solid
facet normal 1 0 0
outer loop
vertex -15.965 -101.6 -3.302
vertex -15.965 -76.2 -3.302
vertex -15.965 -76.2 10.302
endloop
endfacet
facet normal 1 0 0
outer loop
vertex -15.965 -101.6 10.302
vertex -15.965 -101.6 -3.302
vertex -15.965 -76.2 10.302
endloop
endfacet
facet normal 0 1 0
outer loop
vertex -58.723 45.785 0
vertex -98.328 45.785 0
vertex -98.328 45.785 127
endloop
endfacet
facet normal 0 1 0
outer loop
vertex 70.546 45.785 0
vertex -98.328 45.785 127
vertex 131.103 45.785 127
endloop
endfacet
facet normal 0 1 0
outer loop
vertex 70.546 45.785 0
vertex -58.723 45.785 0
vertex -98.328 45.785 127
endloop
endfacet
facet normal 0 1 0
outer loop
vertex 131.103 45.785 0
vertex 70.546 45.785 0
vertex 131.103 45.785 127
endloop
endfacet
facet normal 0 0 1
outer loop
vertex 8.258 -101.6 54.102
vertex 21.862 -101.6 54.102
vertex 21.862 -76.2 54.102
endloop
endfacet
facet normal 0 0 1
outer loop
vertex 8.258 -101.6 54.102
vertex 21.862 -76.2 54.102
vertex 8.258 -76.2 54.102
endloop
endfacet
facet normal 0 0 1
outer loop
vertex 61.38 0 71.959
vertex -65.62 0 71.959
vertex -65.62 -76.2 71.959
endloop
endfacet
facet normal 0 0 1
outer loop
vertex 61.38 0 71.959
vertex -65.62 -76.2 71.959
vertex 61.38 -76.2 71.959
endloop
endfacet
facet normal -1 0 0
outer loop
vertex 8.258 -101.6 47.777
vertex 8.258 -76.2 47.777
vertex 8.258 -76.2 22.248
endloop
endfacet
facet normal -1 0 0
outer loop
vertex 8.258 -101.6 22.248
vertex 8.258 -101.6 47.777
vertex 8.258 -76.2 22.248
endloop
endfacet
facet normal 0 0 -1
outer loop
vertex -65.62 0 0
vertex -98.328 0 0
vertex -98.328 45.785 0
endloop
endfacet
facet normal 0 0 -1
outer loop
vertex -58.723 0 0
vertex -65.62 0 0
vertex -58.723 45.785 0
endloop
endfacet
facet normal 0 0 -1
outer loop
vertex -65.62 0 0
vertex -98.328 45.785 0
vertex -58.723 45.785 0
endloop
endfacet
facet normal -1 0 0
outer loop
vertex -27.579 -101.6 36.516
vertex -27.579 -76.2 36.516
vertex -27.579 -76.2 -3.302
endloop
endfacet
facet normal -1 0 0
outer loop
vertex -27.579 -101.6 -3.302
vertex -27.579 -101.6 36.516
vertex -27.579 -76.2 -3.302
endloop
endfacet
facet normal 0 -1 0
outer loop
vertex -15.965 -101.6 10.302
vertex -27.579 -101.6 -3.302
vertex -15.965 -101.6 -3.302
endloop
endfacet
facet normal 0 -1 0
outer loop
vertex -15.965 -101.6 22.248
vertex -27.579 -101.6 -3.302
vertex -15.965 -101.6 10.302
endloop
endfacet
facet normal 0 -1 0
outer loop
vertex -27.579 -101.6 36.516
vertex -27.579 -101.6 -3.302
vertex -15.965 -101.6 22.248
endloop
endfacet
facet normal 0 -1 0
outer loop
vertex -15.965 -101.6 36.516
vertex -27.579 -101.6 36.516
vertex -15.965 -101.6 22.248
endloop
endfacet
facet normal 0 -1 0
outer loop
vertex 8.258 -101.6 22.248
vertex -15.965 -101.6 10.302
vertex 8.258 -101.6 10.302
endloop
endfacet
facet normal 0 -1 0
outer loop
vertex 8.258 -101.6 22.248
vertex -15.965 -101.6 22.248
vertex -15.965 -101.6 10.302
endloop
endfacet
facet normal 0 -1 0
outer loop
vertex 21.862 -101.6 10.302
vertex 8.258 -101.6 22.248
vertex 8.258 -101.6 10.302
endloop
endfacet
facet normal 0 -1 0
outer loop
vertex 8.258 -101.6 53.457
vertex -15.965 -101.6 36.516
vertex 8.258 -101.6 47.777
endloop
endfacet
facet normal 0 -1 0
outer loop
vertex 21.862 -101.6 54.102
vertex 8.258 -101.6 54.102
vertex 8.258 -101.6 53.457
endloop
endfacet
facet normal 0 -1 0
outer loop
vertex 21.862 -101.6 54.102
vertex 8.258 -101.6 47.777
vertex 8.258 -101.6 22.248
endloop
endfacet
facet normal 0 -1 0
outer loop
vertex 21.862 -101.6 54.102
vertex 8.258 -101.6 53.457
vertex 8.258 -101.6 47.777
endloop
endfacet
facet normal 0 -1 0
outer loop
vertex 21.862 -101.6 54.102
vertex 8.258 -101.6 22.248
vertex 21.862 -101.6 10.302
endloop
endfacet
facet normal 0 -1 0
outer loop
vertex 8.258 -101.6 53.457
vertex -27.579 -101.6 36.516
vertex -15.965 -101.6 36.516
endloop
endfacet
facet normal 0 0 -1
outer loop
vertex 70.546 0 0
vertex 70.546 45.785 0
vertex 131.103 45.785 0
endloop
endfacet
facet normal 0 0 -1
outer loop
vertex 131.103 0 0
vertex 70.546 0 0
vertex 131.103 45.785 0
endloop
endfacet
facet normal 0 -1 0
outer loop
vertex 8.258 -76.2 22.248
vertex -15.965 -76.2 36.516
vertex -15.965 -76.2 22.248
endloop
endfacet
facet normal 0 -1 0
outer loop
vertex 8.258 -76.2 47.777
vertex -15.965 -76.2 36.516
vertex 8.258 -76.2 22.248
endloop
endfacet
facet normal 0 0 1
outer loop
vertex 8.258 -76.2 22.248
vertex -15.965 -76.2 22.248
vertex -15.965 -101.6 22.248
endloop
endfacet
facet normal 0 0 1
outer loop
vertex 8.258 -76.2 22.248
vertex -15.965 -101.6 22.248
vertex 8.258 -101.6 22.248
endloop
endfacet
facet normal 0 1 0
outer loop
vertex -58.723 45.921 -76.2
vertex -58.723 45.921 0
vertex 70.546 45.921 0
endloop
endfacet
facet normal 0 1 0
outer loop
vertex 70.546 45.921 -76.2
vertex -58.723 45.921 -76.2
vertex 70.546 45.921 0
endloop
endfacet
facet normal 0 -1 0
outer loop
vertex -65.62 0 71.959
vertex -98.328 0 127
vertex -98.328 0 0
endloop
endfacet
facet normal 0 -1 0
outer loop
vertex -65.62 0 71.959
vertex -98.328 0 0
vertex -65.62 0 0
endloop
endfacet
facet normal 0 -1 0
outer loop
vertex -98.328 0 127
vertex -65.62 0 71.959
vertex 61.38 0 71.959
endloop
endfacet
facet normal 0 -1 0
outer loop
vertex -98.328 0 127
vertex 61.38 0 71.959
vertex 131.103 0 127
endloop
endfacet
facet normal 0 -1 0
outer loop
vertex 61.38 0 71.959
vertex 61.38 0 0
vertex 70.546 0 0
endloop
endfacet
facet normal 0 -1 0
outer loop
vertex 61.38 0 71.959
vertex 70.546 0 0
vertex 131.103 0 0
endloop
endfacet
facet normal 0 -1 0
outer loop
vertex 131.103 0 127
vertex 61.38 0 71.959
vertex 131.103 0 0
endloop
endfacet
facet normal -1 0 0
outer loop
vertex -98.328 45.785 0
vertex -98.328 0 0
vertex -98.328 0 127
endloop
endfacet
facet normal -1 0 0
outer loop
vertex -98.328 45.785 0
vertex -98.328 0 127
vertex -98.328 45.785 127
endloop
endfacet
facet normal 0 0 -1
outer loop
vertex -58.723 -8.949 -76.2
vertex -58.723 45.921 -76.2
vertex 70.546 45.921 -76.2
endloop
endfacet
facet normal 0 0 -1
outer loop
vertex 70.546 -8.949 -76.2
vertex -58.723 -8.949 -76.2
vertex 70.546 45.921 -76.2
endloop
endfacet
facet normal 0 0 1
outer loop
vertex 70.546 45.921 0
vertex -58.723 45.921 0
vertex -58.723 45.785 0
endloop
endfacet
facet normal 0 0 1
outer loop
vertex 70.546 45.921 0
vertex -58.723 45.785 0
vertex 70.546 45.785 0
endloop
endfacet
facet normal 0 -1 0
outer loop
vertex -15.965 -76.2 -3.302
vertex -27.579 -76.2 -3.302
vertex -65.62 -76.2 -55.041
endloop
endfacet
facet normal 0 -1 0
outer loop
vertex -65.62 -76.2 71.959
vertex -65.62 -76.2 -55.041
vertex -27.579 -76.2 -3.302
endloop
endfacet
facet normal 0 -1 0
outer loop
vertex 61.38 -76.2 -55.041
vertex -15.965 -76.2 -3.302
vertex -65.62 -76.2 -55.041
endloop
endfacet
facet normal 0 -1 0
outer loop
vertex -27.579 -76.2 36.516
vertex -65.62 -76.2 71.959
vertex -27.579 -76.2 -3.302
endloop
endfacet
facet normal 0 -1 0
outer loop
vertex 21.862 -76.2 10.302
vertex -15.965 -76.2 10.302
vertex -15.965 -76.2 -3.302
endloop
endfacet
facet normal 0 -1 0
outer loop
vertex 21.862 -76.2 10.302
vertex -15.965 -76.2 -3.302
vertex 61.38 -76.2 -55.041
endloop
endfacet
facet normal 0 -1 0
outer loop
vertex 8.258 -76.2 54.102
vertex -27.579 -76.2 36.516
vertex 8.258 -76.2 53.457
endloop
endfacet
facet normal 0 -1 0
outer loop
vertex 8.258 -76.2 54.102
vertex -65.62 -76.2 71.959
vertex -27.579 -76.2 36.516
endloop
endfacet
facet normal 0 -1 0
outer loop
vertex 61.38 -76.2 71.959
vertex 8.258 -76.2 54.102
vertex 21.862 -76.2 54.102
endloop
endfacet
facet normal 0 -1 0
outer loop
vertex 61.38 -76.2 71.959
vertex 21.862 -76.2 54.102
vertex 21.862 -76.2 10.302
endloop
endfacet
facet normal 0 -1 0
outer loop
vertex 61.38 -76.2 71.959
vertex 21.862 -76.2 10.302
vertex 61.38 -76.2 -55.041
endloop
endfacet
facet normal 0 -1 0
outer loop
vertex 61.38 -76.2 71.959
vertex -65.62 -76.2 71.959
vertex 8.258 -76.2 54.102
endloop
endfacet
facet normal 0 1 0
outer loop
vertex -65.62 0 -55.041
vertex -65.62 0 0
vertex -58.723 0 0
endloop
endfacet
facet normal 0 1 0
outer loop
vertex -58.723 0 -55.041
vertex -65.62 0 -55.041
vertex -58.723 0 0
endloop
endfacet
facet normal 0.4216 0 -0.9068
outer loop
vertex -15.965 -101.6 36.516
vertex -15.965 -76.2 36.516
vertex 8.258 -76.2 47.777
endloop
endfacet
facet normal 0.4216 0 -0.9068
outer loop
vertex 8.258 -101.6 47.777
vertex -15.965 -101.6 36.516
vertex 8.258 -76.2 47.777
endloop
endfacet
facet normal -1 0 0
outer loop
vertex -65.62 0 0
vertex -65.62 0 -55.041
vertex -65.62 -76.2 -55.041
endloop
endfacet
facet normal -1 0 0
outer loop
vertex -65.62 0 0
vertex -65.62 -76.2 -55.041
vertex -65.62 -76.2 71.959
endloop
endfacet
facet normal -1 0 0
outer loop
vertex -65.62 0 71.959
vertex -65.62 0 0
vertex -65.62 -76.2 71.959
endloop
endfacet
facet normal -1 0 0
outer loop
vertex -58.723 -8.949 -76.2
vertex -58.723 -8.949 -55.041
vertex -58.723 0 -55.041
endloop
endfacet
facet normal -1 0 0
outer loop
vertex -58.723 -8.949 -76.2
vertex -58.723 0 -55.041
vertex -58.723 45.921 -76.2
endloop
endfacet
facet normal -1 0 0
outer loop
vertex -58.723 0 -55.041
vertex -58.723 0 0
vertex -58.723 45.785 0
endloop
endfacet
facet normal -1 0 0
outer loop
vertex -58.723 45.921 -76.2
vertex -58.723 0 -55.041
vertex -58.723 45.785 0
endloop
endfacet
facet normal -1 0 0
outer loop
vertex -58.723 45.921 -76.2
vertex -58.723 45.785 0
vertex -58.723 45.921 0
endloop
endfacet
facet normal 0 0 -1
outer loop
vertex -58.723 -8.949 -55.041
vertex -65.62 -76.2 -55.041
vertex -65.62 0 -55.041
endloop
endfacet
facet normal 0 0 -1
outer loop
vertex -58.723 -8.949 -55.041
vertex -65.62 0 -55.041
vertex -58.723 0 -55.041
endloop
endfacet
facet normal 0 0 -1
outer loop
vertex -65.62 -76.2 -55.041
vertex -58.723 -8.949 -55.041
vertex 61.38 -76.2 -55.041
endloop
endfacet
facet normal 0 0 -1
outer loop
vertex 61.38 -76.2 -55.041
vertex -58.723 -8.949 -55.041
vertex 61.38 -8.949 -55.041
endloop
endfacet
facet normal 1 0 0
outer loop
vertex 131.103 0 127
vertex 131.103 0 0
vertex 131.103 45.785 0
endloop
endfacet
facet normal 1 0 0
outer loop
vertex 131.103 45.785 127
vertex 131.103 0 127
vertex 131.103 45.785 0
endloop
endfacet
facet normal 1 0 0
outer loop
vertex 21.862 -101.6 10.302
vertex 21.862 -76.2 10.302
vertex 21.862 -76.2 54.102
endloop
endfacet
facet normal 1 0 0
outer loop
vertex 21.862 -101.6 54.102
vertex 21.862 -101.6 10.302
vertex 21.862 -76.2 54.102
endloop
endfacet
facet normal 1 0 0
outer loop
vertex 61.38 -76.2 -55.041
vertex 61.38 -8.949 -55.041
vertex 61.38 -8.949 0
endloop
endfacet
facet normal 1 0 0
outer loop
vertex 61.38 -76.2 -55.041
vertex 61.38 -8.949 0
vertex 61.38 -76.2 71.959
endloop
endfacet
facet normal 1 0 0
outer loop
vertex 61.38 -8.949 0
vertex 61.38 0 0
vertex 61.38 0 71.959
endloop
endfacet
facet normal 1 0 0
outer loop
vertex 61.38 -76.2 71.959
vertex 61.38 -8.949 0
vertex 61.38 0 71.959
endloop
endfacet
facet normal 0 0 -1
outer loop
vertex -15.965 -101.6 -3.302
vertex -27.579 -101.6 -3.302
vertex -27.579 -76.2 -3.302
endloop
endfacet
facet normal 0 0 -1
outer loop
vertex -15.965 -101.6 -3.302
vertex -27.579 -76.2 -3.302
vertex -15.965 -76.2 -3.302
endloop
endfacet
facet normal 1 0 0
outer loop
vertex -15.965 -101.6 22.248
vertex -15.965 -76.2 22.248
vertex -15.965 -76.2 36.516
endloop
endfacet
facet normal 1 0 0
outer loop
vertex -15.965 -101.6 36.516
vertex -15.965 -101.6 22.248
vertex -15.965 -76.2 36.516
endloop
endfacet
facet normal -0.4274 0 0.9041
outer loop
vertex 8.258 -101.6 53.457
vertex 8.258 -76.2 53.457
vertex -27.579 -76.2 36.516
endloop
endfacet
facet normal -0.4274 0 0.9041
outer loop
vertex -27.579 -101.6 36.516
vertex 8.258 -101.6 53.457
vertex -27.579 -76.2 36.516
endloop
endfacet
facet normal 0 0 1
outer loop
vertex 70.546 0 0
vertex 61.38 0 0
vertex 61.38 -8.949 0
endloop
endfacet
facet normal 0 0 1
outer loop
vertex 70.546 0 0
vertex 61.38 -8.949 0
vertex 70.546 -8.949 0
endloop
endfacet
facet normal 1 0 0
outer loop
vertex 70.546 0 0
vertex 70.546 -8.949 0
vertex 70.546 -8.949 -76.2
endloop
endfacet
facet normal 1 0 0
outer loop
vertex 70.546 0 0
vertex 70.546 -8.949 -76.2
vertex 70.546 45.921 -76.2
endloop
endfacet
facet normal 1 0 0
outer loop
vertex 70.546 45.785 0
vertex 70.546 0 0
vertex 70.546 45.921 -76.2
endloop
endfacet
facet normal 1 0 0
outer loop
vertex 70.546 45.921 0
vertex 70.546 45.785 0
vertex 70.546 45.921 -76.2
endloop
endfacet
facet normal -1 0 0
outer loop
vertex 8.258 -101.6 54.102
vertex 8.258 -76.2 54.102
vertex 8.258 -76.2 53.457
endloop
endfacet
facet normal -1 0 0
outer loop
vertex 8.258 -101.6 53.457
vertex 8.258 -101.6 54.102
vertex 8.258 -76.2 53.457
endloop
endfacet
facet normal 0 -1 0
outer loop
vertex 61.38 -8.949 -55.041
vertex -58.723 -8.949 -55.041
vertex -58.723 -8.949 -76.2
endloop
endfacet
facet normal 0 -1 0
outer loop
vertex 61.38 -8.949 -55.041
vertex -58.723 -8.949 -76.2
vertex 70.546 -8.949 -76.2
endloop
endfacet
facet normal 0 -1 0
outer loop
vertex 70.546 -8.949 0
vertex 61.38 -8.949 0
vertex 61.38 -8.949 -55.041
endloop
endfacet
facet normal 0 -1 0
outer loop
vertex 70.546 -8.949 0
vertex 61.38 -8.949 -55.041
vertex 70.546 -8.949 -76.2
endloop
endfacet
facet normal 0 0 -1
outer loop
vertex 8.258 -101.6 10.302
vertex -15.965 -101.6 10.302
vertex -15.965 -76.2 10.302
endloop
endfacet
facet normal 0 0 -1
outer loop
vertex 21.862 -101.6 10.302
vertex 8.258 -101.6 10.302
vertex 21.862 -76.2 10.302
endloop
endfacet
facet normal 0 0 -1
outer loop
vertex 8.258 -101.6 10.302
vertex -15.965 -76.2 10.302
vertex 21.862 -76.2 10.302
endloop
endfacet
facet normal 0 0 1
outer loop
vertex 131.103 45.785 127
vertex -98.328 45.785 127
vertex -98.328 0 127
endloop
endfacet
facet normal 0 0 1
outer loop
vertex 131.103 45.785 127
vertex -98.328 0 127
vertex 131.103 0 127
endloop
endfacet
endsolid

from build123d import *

# Parameters (mm, degrees)
F0_W     = 127
F0_H     = 127
F1_DEPTH = 76.2
F2_W     = 229.4309809804
F2_H     = 45.7849353552
F3_DEPTH = 127
F4_W     = 129.2693130672
F4_H     = 54.8701006919
F5_DEPTH = 76.2
F6_W     = 24.2228312418
F6_H     = 11.9455056265
F7_DEPTH = 101.6


with BuildPart() as f1:
    # F0 (on Front) → F1 (new body)
    with BuildSketch(Plane.XZ):
        with Locations((-2.1202601492, 8.4589998459)):
            Rectangle(F0_W, F0_H)
    extrude(amount=F1_DEPTH)

    # F2 (on Top) → F3 (join)
    with BuildSketch(Plane.XY):
        with Locations((16.3871459663, 22.8924676776)):
            Rectangle(F2_W, F2_H)
    extrude(amount=F3_DEPTH)

    # F4 (on Top) → F5 (join)
    with BuildSketch(Plane.XY):
        with Locations((5.9114117175, 18.4862976894)):
            Rectangle(F4_W, F4_H)
    extrude(amount=-F5_DEPTH)

    # F6 (on Front) → F7 (join)
    with BuildSketch(Plane.XZ):
        Polygon((8.2575650886, 53.4568582272), (-27.5789517909, 36.5159586072), (-15.9652661532, 36.5159586072), (8.2575650886, 47.7774481696), align=None)
        Polygon((-15.9652661532, 36.5159586072), (-27.5789517909, 36.5159586072), (-27.5789517909, -3.3023932483), (-15.9652661532, -3.3023932483), (-15.9652661532, 10.3022092953), (-15.9652661532, 22.2477149218), align=None)
        Polygon((8.2575650886, 54.1023947299), (8.2575650886, 53.4568582272), (8.2575650886, 47.7774481696), (21.8621697277, 54.1023947299), align=None)
        with Locations((-3.8538505323, 16.2749621086)):
            Rectangle(F6_W, F6_H)
        Polygon((21.8621697277, 54.1023947299), (8.2575650886, 47.7774481696), (8.2575650886, 22.2477149218), (8.2575650886, 10.3022092953), (21.8621697277, 10.3022092953), align=None)
    extrude(amount=F7_DEPTH)


solid = f1.part
